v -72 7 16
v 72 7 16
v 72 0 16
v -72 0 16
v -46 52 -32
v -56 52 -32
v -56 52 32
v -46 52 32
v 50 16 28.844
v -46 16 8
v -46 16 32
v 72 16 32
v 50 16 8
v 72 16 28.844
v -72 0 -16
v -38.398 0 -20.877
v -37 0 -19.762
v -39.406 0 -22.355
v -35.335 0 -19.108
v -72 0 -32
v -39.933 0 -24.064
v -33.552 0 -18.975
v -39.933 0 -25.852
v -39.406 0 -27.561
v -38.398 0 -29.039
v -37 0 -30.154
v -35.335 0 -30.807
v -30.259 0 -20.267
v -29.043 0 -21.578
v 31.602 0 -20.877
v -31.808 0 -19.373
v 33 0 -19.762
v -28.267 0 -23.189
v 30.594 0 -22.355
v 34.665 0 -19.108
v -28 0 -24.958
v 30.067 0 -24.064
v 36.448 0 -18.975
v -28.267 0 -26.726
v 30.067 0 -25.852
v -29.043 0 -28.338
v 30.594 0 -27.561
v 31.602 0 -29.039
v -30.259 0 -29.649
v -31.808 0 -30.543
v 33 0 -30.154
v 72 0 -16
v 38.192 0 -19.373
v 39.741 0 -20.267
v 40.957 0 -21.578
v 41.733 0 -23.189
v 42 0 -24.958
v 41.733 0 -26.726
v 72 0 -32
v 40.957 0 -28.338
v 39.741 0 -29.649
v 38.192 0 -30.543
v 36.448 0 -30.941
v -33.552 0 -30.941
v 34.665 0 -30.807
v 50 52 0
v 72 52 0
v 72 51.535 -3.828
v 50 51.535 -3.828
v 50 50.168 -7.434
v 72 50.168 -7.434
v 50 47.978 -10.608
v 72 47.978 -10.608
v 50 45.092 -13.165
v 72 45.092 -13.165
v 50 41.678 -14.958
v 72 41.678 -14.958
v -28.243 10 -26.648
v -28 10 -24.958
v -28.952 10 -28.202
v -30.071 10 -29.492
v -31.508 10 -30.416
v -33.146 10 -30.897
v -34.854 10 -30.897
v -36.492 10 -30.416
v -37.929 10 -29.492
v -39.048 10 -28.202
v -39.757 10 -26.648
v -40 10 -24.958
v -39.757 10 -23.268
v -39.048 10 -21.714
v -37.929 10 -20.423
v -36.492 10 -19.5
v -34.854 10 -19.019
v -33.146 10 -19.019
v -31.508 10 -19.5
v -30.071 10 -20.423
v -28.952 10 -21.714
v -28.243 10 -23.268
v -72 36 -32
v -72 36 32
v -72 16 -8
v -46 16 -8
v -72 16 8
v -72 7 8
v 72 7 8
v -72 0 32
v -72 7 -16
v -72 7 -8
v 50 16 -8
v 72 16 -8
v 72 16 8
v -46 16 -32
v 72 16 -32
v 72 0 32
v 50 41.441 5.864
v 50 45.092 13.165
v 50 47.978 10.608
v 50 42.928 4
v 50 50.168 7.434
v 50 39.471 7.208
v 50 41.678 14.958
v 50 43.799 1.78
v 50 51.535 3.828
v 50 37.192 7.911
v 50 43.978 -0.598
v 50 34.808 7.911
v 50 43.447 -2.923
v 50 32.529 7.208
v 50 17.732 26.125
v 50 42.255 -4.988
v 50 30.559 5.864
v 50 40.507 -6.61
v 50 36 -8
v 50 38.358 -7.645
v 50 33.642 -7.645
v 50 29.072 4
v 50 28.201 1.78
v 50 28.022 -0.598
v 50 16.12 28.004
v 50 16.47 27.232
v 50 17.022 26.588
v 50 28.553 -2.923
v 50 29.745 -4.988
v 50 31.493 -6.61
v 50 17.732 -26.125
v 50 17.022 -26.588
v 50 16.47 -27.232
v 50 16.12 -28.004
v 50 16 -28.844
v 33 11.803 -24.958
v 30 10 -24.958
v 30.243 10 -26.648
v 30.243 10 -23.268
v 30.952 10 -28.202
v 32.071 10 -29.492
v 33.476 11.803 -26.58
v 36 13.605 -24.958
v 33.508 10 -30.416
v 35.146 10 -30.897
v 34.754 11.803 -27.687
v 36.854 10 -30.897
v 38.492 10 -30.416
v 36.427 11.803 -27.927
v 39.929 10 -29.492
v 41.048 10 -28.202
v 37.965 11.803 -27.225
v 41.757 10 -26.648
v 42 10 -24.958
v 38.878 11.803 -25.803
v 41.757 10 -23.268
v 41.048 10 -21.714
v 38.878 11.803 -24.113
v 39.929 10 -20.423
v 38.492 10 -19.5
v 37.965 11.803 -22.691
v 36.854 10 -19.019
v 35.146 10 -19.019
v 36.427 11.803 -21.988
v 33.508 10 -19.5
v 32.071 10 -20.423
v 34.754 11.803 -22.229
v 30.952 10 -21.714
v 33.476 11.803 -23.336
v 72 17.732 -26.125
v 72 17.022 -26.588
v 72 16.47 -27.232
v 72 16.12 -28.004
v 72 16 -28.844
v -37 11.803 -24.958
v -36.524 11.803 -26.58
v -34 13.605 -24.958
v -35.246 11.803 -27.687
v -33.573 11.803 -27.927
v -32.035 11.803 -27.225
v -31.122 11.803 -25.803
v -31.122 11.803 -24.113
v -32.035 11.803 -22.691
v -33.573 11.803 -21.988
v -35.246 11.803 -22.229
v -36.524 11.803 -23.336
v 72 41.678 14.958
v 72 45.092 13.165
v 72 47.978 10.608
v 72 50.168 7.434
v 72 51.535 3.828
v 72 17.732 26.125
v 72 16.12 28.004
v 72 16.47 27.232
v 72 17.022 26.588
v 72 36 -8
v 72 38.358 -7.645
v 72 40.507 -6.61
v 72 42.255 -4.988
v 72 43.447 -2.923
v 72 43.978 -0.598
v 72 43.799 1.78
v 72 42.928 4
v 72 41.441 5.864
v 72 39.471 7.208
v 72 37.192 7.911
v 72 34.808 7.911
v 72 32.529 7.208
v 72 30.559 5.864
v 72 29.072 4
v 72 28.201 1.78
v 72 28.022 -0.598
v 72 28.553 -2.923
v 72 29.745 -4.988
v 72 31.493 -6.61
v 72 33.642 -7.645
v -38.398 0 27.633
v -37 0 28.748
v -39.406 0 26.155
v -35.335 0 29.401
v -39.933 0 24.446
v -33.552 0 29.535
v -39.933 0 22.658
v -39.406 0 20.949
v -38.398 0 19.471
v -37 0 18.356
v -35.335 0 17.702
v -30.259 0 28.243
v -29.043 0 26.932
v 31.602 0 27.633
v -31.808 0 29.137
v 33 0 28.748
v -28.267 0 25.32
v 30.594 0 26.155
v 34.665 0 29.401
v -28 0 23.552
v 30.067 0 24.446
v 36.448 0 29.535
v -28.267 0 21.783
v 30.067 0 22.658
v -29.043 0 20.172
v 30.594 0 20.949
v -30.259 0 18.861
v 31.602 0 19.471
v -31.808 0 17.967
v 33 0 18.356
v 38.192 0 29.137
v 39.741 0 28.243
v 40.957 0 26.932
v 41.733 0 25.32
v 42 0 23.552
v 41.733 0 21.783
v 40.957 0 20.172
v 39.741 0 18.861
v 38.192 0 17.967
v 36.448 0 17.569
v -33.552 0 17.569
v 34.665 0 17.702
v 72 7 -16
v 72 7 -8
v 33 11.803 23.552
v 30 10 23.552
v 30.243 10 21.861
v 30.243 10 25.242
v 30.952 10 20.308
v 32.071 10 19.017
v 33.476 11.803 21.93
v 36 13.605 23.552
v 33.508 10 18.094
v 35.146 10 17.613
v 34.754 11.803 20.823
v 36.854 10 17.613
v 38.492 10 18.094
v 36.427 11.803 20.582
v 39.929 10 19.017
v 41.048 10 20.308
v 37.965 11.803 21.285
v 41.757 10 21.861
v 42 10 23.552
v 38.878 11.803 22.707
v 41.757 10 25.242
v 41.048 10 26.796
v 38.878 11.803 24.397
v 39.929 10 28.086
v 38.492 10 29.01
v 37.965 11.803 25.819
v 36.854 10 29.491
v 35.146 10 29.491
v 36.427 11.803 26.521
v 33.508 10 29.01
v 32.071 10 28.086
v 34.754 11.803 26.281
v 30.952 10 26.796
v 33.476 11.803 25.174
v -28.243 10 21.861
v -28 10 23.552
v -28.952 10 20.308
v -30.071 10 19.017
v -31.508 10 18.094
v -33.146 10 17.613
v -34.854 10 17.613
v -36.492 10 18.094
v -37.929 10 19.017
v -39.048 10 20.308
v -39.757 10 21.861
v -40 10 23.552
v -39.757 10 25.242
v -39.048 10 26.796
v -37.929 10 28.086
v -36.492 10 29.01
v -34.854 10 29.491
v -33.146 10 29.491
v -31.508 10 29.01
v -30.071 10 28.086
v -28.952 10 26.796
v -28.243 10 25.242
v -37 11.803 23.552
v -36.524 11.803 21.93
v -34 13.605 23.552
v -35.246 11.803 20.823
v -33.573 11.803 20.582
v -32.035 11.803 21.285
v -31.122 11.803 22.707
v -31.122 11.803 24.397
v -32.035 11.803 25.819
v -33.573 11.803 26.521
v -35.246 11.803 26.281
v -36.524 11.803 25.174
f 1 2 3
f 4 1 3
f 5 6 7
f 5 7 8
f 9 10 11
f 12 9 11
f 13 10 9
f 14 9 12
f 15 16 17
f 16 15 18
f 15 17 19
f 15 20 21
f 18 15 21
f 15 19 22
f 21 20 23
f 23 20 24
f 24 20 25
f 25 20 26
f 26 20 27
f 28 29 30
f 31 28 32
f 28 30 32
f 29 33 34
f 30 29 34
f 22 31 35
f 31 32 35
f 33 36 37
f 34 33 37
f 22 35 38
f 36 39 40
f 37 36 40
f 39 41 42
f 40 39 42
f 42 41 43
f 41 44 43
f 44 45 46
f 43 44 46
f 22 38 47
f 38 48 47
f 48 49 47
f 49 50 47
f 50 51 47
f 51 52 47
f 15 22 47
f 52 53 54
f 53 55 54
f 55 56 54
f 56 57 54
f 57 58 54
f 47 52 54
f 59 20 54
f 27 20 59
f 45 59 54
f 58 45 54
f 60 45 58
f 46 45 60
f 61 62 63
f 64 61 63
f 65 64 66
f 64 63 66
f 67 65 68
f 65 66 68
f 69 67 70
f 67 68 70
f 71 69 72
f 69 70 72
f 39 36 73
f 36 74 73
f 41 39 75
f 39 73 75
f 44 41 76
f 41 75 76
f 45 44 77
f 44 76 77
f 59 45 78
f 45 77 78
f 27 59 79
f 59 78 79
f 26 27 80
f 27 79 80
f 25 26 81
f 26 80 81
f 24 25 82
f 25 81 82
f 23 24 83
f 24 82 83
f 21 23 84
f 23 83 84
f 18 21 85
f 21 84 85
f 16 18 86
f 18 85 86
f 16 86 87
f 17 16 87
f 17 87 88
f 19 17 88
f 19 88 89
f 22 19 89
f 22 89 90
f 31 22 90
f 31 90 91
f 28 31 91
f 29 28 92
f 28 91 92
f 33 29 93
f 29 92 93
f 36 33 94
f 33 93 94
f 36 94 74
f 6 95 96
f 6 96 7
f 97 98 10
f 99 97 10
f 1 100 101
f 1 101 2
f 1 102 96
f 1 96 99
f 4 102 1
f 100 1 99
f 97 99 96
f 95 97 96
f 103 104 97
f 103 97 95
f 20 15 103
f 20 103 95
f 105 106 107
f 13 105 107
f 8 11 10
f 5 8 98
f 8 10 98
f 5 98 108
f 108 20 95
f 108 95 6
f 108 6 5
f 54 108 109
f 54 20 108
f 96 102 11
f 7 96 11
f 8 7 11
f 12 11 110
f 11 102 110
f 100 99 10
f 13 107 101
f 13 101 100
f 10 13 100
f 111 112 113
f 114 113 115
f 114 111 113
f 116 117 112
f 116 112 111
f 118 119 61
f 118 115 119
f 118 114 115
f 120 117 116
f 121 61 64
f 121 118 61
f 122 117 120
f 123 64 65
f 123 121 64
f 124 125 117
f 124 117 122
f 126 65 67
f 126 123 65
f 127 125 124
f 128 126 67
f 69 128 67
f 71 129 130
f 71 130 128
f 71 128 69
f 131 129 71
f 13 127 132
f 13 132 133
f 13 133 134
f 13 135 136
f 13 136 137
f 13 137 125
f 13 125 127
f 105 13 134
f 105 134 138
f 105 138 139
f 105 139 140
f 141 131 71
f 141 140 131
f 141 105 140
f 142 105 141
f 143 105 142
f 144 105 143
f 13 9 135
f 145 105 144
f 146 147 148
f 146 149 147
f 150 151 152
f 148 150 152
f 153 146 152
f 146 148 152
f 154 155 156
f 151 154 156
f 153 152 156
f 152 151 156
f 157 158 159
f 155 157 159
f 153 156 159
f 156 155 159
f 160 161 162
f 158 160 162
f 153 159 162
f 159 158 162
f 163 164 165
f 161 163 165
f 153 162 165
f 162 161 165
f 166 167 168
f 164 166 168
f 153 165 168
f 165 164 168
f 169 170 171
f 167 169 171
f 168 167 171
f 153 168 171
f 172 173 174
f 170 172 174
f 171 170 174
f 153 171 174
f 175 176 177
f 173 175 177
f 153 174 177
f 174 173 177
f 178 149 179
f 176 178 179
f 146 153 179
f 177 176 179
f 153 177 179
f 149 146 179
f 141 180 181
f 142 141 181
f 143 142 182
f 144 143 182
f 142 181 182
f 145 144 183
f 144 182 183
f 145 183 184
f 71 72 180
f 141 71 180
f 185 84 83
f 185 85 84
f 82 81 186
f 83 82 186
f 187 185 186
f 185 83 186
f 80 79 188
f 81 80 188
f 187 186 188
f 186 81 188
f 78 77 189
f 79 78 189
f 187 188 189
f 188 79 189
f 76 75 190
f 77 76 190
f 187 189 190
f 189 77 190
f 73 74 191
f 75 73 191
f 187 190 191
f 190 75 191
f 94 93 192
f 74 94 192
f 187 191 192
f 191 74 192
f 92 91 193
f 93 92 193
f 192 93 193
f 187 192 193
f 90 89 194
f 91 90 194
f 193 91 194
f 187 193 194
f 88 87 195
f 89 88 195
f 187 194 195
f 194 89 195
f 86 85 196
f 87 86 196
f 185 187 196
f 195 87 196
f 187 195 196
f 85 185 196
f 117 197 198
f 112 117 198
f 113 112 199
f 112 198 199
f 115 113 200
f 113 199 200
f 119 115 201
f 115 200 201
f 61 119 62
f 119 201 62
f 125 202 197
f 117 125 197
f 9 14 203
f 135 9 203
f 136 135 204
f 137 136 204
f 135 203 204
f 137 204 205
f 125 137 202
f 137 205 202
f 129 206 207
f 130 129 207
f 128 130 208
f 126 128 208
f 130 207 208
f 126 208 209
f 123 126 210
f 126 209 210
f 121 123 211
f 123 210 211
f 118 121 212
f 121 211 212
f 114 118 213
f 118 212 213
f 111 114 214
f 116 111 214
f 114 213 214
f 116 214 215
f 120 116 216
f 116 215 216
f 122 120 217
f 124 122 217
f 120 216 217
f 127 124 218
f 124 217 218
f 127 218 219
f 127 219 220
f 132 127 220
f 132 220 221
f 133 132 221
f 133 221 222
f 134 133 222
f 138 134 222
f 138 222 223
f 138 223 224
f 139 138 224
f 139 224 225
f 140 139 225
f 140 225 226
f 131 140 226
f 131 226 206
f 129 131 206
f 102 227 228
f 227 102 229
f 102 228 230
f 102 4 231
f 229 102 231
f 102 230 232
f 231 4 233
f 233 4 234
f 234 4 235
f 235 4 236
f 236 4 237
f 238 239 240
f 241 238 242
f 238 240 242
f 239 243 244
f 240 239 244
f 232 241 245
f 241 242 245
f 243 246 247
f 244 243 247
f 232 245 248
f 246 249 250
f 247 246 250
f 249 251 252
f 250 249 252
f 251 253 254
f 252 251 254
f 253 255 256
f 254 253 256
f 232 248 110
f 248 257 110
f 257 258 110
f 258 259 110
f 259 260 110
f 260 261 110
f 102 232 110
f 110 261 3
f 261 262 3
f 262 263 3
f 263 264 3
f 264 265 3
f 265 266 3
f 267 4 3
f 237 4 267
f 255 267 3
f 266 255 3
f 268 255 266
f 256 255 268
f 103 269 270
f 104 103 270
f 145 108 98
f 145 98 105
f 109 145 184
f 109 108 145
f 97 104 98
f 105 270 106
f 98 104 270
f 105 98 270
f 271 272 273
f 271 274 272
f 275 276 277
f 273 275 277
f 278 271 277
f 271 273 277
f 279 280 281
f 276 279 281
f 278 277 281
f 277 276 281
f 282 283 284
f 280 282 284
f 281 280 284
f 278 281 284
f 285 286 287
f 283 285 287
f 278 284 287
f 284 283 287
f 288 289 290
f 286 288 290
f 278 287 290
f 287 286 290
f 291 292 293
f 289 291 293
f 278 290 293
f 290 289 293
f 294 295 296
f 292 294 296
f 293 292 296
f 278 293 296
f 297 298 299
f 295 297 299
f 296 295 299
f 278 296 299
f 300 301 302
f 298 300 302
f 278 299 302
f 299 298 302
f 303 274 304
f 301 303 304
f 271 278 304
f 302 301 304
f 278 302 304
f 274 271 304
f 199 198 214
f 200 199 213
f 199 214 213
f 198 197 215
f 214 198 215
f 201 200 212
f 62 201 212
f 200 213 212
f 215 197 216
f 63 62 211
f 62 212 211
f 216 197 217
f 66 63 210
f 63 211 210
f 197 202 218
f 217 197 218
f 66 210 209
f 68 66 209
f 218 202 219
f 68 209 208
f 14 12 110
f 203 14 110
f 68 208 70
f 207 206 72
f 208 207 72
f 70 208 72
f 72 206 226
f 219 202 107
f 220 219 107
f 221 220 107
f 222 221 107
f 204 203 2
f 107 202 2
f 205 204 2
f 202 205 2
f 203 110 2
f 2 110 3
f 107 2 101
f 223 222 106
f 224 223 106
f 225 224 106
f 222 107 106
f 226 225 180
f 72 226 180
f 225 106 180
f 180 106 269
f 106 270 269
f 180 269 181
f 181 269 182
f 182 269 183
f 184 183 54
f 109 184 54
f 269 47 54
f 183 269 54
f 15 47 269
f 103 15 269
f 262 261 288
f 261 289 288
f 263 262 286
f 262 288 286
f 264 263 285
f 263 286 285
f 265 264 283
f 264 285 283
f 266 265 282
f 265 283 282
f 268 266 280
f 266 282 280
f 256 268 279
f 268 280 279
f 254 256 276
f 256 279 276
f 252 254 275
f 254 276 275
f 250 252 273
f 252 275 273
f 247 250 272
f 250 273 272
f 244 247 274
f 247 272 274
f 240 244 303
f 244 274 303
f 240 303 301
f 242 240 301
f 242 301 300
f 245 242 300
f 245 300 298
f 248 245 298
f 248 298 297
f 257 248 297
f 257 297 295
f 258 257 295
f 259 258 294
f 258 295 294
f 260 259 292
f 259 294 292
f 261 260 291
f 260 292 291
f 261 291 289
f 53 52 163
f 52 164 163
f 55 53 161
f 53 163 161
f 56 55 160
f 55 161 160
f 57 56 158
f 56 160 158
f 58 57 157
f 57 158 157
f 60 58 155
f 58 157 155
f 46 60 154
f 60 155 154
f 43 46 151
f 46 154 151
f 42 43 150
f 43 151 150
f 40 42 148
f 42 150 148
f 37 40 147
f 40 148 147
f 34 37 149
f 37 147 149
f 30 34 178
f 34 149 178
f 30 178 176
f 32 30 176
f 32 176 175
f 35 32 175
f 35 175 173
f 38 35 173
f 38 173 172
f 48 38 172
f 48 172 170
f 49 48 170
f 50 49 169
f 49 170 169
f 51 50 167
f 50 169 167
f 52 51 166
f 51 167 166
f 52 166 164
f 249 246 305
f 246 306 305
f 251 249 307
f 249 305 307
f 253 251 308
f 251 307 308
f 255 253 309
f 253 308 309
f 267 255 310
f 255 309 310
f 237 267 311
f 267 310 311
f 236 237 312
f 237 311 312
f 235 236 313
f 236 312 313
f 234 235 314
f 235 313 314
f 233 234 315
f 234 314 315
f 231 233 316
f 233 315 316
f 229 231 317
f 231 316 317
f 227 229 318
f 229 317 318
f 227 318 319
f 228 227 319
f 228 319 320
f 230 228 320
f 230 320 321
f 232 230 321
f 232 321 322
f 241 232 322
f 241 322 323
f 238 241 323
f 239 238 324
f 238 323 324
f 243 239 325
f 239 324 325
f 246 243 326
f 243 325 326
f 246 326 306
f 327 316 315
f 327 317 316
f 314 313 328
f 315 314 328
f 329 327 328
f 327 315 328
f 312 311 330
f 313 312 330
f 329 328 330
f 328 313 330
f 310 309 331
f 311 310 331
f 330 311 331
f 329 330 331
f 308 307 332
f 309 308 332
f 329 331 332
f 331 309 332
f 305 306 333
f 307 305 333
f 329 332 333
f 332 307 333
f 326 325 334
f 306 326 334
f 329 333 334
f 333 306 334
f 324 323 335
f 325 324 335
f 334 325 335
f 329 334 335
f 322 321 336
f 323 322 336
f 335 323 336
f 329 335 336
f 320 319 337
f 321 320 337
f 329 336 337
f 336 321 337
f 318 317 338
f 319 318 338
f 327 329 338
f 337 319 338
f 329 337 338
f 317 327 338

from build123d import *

# Parameters (mm, degrees)
SKETCH1_W                  = 144
SKETCH1_H                  = 64
BOSS_EXTRUDE1_DEPTH        = 16
SKETCH2_W                  = 26
SKETCH2_H                  = 64
BOSS_EXTRUDE2_DEPTH        = 36
CUT_EXTRUDE1_DEPTH         = 1
CUT_EXTRUDE1_DEPTH_BACK    = 65
SKETCH4_W                  = 22
SKETCH4_H                  = 64
BOSS_EXTRUDE3_DEPTH        = 36
CUT_EXTRUDE2_DEPTH         = 1
CUT_EXTRUDE2_DEPTH_BACK    = 145
SKETCH6_R                  = 8
CUT_EXTRUDE3_DEPTH         = 36
F_12_0MM_DOWEL_HOLE1_D     = 12
F_12_0MM_DOWEL_HOLE1_DEPTH = 10
F_12_0MM_DOWEL_HOLE1_TIP   = 3.605163714


with BuildPart() as part:
    # Sketch1 → Boss-Extrude1 (new body)
    with BuildSketch(Plane(origin=(0, 0, 0), x_dir=(1, 0, 0), z_dir=(0, 1, 0))):
        Rectangle(SKETCH1_W, SKETCH1_H)
    extrude(amount=BOSS_EXTRUDE1_DEPTH)

    # Sketch2 → Boss-Extrude2 (add)
    with BuildSketch(Plane(origin=(0, 16, 0), x_dir=(1, 0, 0), z_dir=(0, 1, 0))):
        with Locations((-59, 0)):
            Rectangle(SKETCH2_W, SKETCH2_H)
    extrude(amount=BOSS_EXTRUDE2_DEPTH)

    # Sketch3 → Cut-Extrude1 (cut, two sides)
    with BuildSketch(Plane.XY.offset(32)) as cut_extrude1_sk:
        Polygon((-72, 36), (-56, 52), (-72, 52), align=None)
    extrude(amount=CUT_EXTRUDE1_DEPTH, mode=Mode.SUBTRACT)
    extrude(cut_extrude1_sk.sketch, amount=-CUT_EXTRUDE1_DEPTH_BACK, mode=Mode.SUBTRACT)

    # Sketch4 → Boss-Extrude3 (add)
    with BuildSketch(Plane(origin=(0, 16, 0), x_dir=(1, 0, 0), z_dir=(0, 1, 0))):
        with Locations((61, 0)):
            Rectangle(SKETCH4_W, SKETCH4_H)
    extrude(amount=BOSS_EXTRUDE3_DEPTH)

    # Sketch5 → Cut-Extrude2 (cut, two sides)
    with BuildSketch(Plane(origin=(72, 0, 0), x_dir=(0, 0, -1), z_dir=(1, 0, 0))) as cut_extrude2_sk:
        Polygon((-16, 7), (-16, 0), (16, 0), (16, 7), (8, 7), (8, 16), (-8, 16), (-8, 7), align=None)
    extrude(amount=CUT_EXTRUDE2_DEPTH, mode=Mode.SUBTRACT)
    extrude(cut_extrude2_sk.sketch, amount=-CUT_EXTRUDE2_DEPTH_BACK, mode=Mode.SUBTRACT)

    # Sketch6 → Cut-Extrude3 (cut)
    with BuildSketch(Plane(origin=(72, 0, 0), x_dir=(0, 0, -1), z_dir=(1, 0, 0))):
        with BuildLine():
            Line((-32, 52), (-32, 16))
            Line((-32, 16), (-28.843717868, 16))
            ThreePointArc((-28.843717868, 16), (-27.231819043, 16.469825663), (-26.124794507, 17.732145215))
            Line((-26.124794507, 17.732145215), (-14.958449756, 41.678448811))
            ThreePointArc((-14.958449756, 41.678448811), (-9.086936164, 49.169190983), (8.8e-08, 52))
            Line((8.8e-08, 52), (-32, 52))
        make_face()
        with Locations((0, 36)):
            Circle(SKETCH6_R)
        with BuildLine():
            Line((32, 52), (8.8e-08, 52))
            ThreePointArc((8.8e-08, 52), (9.086936237, 49.169190933), (14.958449756, 41.678448811))
            Line((14.958449756, 41.678448811), (26.124794507, 17.732145215))
            ThreePointArc((26.124794507, 17.732145215), (27.231819043, 16.469825663), (28.843717868, 16))
            Line((28.843717868, 16), (32, 16))
            Line((32, 16), (32, 52))
        make_face()
    extrude(amount=-CUT_EXTRUDE3_DEPTH, mode=Mode.SUBTRACT)

    # Ø12.0mm Dowel Hole1
    with Locations(Plane(origin=(0, 0, 0), x_dir=(-1, 0, 0), z_dir=(0, -1, 0))):
        with Locations((34, -23.551834062), (-36, -23.551834062), (-36, 24.957913708), (34, 24.957913708)):
            Hole(F_12_0MM_DOWEL_HOLE1_D / 2, depth=F_12_0MM_DOWEL_HOLE1_DEPTH)
            with Locations((0, 0, -(F_12_0MM_DOWEL_HOLE1_DEPTH + F_12_0MM_DOWEL_HOLE1_TIP / 2))):  # 118° drill point
                Cone(0, F_12_0MM_DOWEL_HOLE1_D / 2, F_12_0MM_DOWEL_HOLE1_TIP, mode=Mode.SUBTRACT)


solid = part.part
